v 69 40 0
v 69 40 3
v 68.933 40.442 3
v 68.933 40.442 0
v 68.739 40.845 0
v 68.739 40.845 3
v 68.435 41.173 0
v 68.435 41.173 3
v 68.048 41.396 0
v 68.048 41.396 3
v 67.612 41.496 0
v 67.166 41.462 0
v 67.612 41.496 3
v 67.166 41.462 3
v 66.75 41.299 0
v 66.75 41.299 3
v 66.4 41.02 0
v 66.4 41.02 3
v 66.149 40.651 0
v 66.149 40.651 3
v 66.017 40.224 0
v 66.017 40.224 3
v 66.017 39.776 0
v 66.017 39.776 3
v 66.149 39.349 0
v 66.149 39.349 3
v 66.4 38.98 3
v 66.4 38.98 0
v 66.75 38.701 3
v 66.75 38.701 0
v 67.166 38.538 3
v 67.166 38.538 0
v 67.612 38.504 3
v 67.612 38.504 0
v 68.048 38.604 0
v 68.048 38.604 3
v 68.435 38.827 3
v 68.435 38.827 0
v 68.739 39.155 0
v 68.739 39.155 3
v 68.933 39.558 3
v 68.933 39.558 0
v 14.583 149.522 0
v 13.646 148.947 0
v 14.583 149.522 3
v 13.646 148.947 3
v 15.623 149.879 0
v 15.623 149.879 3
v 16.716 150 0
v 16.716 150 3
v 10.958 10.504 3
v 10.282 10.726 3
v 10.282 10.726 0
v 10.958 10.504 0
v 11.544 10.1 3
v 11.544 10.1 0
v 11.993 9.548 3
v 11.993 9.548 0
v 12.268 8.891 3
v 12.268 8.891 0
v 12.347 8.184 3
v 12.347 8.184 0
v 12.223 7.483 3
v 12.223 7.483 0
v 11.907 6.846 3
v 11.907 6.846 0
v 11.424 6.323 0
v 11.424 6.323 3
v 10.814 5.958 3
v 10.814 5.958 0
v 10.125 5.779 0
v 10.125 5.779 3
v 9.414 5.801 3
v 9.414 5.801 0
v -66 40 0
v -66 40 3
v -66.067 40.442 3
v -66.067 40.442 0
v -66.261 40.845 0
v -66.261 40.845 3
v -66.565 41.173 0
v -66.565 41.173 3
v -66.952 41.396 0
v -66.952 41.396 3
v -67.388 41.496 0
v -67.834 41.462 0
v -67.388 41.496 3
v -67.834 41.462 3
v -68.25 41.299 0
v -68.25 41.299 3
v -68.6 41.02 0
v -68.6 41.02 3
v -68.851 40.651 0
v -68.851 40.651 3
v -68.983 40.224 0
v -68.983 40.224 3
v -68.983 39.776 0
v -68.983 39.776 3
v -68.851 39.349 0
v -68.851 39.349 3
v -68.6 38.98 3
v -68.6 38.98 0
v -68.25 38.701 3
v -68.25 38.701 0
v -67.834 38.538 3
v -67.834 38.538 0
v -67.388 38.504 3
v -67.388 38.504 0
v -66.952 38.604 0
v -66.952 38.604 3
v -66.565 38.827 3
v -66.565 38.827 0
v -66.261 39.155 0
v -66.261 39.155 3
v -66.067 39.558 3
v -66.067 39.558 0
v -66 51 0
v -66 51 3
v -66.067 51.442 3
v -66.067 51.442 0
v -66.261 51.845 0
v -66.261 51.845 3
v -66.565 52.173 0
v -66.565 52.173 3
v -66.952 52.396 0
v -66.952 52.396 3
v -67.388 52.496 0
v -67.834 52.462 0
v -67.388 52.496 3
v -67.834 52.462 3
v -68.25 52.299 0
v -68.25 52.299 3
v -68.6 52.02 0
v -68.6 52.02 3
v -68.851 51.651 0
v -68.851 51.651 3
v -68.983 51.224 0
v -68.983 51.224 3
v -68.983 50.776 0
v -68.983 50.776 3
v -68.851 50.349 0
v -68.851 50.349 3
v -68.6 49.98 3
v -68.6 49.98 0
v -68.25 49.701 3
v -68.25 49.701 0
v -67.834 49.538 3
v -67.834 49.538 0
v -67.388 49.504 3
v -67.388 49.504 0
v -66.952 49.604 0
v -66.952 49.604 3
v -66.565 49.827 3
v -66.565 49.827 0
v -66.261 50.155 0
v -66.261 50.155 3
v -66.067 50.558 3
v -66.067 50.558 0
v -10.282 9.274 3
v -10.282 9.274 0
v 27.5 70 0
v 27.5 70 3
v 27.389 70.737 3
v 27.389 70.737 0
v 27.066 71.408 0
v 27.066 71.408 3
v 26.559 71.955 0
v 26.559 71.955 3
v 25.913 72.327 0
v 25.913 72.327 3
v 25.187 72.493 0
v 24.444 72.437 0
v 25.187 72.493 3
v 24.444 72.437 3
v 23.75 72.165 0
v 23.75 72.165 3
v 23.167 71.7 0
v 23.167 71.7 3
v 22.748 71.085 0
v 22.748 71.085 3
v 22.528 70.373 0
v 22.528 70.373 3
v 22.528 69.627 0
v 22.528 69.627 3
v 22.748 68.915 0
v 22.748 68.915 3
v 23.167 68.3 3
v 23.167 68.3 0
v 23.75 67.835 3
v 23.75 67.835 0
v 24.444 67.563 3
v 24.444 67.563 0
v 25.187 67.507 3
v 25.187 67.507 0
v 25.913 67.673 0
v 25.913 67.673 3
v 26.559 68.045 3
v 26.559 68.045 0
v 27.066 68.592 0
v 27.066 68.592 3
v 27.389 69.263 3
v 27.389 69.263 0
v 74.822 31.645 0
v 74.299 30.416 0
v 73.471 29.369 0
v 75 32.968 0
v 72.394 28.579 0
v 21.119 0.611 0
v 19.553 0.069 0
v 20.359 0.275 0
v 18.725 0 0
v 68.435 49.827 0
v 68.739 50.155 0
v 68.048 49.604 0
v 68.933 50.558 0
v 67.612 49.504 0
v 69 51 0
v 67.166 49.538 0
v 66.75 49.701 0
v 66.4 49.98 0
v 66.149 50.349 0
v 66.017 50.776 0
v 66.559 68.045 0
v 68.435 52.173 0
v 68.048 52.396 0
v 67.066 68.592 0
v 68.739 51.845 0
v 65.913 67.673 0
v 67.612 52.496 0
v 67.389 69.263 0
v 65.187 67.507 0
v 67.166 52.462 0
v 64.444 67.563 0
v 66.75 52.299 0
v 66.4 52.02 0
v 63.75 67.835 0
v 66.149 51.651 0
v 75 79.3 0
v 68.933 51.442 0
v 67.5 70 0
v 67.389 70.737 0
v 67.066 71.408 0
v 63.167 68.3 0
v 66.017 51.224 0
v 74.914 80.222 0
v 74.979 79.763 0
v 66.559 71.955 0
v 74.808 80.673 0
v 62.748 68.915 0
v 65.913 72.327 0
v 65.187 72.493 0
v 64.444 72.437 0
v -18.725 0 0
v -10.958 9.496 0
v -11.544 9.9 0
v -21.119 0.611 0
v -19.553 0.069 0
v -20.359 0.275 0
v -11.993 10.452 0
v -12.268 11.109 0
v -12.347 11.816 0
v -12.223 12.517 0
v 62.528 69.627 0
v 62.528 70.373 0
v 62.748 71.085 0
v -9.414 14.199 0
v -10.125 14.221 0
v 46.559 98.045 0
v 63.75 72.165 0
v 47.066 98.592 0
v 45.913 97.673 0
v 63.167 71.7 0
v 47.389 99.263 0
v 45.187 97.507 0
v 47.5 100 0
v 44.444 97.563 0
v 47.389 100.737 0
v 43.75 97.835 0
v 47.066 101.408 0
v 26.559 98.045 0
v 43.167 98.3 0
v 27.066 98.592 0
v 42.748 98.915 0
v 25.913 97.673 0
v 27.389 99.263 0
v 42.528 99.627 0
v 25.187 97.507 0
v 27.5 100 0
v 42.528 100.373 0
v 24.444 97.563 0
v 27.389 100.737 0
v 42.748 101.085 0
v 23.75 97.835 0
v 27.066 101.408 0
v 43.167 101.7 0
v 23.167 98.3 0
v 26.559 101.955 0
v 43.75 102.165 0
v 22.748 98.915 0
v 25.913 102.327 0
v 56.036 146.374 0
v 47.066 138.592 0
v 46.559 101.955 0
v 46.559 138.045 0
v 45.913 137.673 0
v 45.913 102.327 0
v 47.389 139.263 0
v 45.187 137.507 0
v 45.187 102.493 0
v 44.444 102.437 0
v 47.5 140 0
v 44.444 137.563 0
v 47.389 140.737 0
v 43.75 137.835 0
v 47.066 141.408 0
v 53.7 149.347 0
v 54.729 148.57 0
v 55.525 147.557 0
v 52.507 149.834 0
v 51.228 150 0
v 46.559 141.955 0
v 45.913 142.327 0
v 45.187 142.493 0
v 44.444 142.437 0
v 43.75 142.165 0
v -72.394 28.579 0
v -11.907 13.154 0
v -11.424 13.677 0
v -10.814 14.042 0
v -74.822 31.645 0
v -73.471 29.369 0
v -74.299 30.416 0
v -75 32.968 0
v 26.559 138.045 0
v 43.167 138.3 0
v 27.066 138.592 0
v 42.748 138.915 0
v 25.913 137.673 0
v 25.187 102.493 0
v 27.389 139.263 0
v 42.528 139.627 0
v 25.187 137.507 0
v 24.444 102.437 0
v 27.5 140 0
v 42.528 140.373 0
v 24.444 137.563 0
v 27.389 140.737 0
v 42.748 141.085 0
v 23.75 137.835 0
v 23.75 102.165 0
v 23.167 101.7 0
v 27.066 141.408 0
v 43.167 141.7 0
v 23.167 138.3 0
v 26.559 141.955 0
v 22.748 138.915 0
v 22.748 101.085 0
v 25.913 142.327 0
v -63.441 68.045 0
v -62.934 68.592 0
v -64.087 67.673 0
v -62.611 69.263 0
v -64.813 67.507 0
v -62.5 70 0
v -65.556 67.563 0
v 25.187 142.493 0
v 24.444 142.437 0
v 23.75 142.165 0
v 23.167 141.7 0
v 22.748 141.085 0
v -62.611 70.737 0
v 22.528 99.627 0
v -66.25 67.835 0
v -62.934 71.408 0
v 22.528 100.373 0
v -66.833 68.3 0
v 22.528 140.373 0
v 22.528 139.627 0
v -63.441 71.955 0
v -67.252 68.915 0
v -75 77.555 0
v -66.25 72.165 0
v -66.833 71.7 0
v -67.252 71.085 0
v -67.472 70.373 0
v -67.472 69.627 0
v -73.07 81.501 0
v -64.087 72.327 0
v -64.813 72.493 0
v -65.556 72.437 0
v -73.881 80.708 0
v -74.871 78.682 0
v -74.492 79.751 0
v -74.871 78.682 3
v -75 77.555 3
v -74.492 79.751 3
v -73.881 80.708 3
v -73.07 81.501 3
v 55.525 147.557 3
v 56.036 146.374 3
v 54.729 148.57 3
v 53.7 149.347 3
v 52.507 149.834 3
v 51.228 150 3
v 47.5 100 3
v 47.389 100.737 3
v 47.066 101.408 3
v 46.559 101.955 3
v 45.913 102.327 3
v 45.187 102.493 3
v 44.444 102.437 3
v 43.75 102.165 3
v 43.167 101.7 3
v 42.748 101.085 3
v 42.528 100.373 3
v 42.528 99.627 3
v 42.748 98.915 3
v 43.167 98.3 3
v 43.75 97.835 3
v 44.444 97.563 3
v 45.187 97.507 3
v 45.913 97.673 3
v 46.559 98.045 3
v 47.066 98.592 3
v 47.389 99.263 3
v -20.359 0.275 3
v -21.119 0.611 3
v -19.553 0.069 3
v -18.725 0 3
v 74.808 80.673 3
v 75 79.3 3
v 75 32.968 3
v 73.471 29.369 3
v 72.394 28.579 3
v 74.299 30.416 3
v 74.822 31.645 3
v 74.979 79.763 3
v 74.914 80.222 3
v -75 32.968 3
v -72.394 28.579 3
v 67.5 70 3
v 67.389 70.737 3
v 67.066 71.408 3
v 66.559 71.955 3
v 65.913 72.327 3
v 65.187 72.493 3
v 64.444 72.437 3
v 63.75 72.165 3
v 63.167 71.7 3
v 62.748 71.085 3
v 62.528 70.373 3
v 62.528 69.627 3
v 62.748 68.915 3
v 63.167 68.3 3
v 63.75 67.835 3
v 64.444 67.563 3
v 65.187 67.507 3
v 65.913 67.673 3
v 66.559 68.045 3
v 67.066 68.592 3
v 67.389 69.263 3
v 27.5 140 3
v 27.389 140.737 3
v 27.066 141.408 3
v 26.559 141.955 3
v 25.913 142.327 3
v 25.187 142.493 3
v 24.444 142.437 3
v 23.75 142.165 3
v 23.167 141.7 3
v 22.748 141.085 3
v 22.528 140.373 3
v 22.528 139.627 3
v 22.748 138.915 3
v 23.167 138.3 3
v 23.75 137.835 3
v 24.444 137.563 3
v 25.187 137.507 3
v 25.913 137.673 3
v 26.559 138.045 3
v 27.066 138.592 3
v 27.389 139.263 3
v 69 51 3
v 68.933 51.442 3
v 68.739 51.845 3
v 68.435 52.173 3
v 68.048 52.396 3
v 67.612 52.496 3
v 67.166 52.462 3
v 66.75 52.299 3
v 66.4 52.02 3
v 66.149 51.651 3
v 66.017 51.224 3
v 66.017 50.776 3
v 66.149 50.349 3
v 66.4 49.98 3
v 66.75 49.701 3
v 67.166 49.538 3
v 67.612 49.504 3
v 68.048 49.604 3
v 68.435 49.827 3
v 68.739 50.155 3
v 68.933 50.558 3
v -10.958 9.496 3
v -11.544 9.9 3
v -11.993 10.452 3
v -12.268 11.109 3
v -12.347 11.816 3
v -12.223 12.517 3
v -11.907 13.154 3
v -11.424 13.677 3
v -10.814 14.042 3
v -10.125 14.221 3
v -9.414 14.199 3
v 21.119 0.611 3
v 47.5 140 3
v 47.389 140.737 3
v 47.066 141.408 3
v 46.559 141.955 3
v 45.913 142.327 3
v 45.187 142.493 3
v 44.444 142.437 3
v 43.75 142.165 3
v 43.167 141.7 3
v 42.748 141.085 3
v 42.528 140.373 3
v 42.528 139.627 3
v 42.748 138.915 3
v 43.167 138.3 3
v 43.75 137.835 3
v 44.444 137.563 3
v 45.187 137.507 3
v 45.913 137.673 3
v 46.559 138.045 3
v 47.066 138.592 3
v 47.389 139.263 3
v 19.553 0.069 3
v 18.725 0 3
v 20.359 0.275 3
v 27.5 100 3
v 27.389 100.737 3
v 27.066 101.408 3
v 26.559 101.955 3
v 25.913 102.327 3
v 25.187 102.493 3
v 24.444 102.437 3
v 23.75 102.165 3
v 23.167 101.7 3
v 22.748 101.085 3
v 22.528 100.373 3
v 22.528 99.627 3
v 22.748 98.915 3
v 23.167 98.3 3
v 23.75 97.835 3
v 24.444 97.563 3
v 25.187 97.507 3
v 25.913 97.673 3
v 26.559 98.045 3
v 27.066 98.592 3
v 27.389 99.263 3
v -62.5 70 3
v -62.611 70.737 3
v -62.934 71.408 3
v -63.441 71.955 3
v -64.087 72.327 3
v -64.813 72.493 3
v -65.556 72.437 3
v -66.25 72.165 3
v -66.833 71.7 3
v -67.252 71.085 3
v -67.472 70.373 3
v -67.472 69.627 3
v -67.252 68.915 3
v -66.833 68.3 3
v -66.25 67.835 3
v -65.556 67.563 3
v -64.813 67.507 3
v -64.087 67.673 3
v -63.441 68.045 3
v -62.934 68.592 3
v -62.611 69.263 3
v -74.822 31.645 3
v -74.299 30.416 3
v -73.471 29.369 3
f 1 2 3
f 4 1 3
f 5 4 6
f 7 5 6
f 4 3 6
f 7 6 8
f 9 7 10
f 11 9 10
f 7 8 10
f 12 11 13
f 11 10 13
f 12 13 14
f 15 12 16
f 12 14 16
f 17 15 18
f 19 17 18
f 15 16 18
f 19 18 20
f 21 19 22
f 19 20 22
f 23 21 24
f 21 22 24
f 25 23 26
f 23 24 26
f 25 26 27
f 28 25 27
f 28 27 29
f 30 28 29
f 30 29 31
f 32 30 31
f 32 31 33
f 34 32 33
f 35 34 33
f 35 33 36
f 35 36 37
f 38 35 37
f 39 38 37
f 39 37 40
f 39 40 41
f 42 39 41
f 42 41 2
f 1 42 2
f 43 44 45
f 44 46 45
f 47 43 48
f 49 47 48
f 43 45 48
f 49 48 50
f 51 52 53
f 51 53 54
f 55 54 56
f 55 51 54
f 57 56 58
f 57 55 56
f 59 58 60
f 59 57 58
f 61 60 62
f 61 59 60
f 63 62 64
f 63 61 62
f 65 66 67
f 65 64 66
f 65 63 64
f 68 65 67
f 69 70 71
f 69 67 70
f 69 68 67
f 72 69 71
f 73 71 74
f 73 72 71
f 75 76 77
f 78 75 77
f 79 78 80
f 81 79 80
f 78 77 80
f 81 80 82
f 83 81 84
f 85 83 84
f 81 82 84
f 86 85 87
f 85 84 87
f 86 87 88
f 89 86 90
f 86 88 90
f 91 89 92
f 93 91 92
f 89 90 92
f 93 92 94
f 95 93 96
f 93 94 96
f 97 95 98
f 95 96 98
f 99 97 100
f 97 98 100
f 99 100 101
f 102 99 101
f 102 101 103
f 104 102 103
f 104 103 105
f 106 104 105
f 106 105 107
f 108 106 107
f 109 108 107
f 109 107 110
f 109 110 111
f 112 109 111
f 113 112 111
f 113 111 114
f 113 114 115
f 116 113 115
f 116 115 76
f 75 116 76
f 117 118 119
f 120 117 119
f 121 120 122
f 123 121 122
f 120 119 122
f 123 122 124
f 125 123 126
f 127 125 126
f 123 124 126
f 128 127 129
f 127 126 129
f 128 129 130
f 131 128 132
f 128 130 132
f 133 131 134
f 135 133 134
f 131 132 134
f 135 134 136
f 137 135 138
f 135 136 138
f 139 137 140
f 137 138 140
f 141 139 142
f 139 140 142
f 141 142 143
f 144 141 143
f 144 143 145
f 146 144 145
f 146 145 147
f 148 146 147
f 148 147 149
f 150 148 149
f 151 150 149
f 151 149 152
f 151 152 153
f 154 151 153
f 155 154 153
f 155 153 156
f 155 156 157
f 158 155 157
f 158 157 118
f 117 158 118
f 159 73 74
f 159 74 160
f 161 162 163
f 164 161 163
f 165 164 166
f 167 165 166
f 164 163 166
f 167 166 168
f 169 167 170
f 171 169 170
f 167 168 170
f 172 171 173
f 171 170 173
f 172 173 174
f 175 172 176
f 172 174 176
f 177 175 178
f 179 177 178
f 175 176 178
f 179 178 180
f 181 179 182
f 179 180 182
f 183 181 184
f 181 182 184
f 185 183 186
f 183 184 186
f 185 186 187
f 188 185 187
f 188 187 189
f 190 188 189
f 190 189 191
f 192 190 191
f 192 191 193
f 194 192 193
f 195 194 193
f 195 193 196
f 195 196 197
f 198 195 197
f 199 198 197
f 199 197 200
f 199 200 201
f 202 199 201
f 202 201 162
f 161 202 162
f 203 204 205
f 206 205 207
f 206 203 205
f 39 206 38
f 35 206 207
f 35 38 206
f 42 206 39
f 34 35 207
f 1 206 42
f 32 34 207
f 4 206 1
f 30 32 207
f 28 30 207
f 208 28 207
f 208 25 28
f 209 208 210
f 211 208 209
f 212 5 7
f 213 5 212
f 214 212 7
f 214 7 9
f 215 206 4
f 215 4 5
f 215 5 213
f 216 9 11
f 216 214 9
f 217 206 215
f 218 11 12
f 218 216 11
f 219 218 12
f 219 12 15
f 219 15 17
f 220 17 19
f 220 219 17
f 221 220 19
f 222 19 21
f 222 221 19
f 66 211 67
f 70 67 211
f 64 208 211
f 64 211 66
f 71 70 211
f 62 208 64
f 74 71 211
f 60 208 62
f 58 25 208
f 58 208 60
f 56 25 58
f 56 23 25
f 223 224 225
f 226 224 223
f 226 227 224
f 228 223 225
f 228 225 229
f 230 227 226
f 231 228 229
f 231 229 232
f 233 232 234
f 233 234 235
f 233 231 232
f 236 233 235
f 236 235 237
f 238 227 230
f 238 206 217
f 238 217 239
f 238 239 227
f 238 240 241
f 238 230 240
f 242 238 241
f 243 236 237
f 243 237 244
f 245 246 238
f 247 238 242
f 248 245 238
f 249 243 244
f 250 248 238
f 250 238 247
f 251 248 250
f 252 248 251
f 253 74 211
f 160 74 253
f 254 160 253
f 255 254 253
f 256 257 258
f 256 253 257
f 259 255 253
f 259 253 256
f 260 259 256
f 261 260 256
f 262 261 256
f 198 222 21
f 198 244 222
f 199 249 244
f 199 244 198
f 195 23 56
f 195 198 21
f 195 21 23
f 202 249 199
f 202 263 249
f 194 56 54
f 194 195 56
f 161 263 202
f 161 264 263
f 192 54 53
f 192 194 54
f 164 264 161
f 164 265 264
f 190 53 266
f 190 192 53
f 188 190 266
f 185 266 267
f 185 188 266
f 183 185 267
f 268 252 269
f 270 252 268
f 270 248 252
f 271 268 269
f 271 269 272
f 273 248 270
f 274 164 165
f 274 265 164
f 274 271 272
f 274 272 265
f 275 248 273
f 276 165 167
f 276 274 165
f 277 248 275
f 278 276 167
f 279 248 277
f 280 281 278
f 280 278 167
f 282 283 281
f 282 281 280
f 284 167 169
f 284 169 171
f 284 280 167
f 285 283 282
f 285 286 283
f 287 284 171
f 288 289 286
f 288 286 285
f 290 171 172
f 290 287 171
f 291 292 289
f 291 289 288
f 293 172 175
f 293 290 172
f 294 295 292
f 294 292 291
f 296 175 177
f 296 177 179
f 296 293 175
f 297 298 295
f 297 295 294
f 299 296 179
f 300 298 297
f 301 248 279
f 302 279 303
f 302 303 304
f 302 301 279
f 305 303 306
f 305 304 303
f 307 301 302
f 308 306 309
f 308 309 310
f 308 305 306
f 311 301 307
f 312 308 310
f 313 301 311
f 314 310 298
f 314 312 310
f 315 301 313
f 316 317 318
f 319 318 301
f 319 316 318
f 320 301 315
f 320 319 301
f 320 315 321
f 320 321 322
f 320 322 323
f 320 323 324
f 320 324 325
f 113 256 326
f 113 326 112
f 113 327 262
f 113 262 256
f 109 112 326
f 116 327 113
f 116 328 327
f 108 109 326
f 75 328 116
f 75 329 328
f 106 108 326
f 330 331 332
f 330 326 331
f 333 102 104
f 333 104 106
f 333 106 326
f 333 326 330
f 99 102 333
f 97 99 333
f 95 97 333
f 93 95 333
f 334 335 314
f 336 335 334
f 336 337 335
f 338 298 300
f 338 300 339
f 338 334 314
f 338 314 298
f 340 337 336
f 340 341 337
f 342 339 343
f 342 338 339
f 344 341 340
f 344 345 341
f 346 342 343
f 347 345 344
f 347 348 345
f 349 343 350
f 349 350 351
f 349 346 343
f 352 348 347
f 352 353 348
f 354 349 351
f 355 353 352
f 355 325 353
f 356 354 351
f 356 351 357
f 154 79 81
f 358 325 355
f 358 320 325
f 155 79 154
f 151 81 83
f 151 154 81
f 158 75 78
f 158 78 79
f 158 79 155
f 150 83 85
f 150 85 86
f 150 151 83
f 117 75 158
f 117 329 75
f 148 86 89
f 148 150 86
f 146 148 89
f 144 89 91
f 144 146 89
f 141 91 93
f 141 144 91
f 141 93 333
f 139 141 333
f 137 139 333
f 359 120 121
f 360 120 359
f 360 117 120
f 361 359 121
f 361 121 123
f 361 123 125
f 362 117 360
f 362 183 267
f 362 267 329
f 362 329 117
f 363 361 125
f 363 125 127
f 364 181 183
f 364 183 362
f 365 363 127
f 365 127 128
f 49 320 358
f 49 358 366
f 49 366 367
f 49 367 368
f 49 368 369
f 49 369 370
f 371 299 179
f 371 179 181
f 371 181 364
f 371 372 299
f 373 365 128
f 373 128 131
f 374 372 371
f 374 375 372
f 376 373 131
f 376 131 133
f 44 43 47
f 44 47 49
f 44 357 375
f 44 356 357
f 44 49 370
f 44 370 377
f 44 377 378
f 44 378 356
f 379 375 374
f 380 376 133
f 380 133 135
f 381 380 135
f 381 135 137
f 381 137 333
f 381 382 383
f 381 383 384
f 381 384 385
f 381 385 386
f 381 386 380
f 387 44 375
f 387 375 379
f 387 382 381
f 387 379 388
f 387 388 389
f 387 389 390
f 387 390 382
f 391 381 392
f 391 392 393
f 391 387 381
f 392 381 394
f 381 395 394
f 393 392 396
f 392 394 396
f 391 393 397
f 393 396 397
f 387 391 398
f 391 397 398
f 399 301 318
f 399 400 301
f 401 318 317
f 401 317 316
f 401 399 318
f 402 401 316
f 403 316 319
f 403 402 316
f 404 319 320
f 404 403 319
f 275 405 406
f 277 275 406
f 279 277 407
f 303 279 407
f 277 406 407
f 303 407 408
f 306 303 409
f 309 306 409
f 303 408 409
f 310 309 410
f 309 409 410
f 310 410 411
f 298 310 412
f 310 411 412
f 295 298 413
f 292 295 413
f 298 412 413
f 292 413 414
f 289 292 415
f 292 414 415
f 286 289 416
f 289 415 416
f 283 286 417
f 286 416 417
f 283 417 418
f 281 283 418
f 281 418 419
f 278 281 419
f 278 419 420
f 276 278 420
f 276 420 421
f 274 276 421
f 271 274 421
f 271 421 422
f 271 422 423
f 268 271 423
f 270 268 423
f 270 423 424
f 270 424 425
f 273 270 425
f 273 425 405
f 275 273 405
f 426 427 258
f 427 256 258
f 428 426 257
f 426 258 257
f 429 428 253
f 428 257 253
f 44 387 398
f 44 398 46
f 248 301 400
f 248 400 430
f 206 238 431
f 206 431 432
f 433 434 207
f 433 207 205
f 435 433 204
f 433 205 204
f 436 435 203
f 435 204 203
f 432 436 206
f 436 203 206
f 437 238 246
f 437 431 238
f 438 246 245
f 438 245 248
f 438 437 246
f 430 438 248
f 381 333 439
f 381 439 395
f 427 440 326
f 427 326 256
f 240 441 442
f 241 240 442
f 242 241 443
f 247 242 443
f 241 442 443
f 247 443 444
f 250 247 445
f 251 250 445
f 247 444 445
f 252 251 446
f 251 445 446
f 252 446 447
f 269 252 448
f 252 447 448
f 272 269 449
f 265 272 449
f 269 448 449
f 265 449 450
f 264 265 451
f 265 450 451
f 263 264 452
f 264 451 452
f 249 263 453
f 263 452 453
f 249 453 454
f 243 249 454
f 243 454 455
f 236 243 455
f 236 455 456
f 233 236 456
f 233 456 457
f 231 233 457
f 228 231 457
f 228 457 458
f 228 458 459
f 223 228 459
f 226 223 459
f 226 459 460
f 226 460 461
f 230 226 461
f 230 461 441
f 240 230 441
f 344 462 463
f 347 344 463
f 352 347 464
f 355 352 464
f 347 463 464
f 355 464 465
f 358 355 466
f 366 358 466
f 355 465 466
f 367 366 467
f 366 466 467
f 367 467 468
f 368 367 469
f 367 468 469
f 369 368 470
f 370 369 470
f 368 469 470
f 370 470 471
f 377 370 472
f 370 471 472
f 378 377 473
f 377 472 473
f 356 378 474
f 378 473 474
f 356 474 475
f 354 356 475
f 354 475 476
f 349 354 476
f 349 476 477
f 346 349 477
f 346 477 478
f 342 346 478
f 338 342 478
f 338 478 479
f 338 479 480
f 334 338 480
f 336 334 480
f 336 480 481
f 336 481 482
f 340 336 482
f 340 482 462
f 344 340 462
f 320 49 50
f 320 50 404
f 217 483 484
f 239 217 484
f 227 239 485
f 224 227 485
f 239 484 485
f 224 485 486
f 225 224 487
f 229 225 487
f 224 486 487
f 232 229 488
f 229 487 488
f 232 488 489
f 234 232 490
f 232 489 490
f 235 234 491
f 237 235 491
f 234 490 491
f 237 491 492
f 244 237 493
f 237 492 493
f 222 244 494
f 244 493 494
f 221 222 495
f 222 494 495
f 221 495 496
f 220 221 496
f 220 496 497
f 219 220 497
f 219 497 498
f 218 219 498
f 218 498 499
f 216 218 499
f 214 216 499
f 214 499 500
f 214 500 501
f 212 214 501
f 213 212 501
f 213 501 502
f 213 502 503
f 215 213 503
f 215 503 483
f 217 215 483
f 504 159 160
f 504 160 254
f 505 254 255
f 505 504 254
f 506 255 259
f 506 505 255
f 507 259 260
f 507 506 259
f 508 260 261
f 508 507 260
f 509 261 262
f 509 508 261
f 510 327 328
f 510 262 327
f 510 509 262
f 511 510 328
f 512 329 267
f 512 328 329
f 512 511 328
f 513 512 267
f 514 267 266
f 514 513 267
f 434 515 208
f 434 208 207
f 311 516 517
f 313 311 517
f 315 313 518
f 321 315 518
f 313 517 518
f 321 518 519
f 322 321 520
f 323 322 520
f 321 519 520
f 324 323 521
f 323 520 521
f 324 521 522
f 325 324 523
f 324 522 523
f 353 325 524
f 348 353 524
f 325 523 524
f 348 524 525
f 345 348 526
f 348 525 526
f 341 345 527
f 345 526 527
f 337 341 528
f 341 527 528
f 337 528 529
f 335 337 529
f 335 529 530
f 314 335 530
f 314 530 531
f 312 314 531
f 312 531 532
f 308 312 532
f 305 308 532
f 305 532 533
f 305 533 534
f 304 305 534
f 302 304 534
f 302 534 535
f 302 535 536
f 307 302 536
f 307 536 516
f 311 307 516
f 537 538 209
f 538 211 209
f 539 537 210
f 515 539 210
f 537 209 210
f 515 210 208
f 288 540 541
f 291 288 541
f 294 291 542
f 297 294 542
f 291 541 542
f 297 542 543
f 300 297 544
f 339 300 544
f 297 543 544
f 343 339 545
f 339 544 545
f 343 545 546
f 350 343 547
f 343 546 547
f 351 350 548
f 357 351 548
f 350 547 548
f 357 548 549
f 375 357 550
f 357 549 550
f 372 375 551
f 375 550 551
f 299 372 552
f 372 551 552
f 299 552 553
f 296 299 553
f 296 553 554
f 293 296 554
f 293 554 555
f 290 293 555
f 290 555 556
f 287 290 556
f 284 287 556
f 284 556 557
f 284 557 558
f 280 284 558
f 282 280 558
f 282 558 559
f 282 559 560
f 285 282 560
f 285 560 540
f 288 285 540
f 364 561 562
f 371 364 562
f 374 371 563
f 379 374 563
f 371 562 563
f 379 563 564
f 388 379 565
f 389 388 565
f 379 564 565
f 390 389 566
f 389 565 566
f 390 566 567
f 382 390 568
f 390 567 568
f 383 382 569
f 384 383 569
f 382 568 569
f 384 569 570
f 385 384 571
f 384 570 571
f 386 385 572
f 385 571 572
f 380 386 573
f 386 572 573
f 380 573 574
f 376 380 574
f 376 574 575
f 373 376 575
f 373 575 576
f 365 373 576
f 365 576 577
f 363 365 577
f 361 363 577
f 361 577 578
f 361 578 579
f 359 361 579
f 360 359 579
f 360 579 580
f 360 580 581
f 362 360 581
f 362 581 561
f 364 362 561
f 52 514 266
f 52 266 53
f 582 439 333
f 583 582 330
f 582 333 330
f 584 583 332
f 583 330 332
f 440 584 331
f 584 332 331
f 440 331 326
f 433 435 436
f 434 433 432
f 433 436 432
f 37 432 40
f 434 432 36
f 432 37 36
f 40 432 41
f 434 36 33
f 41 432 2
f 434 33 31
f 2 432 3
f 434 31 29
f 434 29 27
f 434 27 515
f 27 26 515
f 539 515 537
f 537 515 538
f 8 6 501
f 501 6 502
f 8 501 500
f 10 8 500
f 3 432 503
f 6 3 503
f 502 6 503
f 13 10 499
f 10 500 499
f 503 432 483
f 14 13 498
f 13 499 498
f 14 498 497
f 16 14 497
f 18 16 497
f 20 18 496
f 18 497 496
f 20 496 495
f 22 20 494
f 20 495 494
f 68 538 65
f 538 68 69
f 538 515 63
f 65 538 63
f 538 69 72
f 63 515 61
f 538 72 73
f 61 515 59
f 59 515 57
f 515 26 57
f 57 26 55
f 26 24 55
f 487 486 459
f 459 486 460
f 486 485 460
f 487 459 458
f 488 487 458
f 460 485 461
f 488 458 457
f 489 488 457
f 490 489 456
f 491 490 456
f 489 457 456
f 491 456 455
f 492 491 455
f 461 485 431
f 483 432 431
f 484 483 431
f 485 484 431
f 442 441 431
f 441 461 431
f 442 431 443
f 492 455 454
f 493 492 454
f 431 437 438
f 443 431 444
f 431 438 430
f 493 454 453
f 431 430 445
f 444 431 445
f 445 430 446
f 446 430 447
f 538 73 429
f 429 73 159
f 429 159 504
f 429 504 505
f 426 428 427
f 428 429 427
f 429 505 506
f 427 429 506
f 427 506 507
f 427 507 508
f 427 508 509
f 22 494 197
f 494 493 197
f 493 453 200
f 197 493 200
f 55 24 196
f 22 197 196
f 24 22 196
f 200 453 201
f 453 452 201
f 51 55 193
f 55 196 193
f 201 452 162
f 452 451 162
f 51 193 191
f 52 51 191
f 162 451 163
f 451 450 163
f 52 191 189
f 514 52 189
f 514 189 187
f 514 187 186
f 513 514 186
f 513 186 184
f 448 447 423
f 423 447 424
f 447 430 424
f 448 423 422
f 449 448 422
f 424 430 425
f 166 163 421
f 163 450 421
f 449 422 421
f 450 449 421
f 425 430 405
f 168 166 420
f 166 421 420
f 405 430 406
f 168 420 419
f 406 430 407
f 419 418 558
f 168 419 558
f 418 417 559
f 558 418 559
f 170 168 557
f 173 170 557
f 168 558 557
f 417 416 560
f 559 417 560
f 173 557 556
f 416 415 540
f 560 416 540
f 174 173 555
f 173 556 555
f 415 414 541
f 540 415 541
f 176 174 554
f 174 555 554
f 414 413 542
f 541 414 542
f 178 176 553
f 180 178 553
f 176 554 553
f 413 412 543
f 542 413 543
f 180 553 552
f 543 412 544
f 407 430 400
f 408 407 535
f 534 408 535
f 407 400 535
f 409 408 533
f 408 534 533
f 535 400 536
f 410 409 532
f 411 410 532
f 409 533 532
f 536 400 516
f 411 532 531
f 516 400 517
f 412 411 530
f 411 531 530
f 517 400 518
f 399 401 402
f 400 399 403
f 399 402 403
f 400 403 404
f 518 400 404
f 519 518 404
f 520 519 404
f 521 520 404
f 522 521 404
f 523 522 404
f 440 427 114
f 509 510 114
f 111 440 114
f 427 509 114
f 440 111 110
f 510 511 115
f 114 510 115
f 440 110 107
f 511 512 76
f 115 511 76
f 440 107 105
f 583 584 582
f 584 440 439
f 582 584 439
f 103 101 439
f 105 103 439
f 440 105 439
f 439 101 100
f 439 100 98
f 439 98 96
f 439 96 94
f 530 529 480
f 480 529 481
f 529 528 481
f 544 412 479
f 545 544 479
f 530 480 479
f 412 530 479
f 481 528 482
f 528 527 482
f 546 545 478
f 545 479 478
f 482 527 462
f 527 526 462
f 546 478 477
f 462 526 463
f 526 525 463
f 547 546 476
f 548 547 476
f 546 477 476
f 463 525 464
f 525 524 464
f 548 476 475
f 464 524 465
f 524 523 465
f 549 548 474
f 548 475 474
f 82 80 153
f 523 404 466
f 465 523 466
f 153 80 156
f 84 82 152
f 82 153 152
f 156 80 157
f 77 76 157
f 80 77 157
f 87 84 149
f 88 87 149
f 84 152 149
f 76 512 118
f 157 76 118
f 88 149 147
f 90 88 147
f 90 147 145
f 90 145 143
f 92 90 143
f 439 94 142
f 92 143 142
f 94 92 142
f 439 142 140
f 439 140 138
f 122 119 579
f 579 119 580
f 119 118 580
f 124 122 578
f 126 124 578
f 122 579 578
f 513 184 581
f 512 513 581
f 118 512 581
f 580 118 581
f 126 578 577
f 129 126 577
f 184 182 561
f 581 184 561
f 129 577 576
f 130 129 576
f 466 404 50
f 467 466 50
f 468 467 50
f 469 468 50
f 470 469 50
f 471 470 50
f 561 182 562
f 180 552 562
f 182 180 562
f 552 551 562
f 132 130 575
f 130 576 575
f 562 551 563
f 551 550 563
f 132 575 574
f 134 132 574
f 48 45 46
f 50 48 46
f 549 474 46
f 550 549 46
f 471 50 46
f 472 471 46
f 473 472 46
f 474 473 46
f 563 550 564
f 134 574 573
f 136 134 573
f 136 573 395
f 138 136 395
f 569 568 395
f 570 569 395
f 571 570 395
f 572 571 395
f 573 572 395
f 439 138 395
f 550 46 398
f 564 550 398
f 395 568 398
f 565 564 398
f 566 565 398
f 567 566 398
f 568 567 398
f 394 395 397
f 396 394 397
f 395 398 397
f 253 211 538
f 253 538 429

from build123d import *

# Parameters (mm, degrees)
BOSS_EXTRUDE1_DEPTH  = 3
SKETCH2_R            = 2.5
SKETCH2_R_2          = 1.5
CUT_EXTRUDE1_DEPTH   = 4
SKETCH3_R            = 2.5
CUT_EXTRUDE2_DEPTH   = 4
LPATTERN1_COUNT      = 2
LPATTERN1_PITCH      = 20
LPATTERN1_COUNT_DIR2 = 2
LPATTERN1_PITCH_DIR2 = 40
CUT_EXTRUDE3_DEPTH   = 4
FILLET1_R            = 5


with BuildPart() as part:
    # Sketch1 → Boss-Extrude1 (new body)
    with BuildSketch(Plane.XY):
        Polygon((-75, 0), (-75, 80), (15, 150), (55, 150), (75, 80), (75, 0), align=None)
    extrude(amount=BOSS_EXTRUDE1_DEPTH)

    # Sketch2 → Cut-Extrude1 (cut, through all)
    with BuildSketch(Plane.XY.offset(3)):
        with Locations((-65, 70)):
            Circle(SKETCH2_R)
        with Locations((65, 70)):
            Circle(SKETCH2_R)
        with Locations((67.5, 51)):
            Circle(SKETCH2_R_2)
        with Locations((25, 70)):
            Circle(SKETCH2_R)
        with Locations((67.5, 40)):
            Circle(SKETCH2_R_2)
        with Locations((-67.5, 51)):
            Circle(SKETCH2_R_2)
        with Locations((-67.5, 40)):
            Circle(SKETCH2_R_2)
        with BuildLine():
            Line((-9.413957086, 14.198501159), (10.282197974, 10.725537606))
            ThreePointArc((10.282197974, 10.725537606), (12.310096913, 7.829397779), (9.413957086, 5.801498841))
            Line((9.413957086, 5.801498841), (-10.282197974, 9.274462394))
            ThreePointArc((-10.282197974, 9.274462394), (-12.310096913, 12.170602221), (-9.413957086, 14.198501159))
        make_face()
    extrude(amount=-CUT_EXTRUDE1_DEPTH, mode=Mode.SUBTRACT)

    # Sketch3 → Cut-Extrude2 (cut, through all)
    with BuildSketch(Plane.XY.offset(3)):
        with Locations((45, 140)):
            Circle(SKETCH3_R)
    cut_extrude2 = extrude(amount=-CUT_EXTRUDE2_DEPTH, mode=Mode.SUBTRACT)

    # LPattern1: Cut-Extrude2 2 × 2
    with Locations(*[(-i * LPATTERN1_PITCH, -j * LPATTERN1_PITCH_DIR2, 0) for i in range(LPATTERN1_COUNT) for j in range(LPATTERN1_COUNT_DIR2) if (i, j) != (0, 0)]):
        add(cut_extrude2, mode=Mode.SUBTRACT)

    # Sketch4 → Cut-Extrude3 (cut, through all)
    with BuildSketch(Plane.XY.offset(3)):
        Polygon((-75, 30), (-20, 0), (-75, 0), align=None)
        Polygon((20, 0), (75, 30), (75, 0), align=None)
    extrude(amount=-CUT_EXTRUDE3_DEPTH, mode=Mode.SUBTRACT)

    # Fillet1
    fillet1_edges = [part.edges().sort_by_distance(p)[0] for p in [
        (55, 150, 1.5),
        (75, 80, 1.5),
        (-75, 80, 1.5),
        (15, 150, 1.5),
        (-75, 30, 1.5),
        (-20, 0, 1.5),
        (20, 0, 1.5),
        (75, 30, 1.5),
    ]]
    fillet(fillet1_edges, radius=FILLET1_R)


solid = part.part
